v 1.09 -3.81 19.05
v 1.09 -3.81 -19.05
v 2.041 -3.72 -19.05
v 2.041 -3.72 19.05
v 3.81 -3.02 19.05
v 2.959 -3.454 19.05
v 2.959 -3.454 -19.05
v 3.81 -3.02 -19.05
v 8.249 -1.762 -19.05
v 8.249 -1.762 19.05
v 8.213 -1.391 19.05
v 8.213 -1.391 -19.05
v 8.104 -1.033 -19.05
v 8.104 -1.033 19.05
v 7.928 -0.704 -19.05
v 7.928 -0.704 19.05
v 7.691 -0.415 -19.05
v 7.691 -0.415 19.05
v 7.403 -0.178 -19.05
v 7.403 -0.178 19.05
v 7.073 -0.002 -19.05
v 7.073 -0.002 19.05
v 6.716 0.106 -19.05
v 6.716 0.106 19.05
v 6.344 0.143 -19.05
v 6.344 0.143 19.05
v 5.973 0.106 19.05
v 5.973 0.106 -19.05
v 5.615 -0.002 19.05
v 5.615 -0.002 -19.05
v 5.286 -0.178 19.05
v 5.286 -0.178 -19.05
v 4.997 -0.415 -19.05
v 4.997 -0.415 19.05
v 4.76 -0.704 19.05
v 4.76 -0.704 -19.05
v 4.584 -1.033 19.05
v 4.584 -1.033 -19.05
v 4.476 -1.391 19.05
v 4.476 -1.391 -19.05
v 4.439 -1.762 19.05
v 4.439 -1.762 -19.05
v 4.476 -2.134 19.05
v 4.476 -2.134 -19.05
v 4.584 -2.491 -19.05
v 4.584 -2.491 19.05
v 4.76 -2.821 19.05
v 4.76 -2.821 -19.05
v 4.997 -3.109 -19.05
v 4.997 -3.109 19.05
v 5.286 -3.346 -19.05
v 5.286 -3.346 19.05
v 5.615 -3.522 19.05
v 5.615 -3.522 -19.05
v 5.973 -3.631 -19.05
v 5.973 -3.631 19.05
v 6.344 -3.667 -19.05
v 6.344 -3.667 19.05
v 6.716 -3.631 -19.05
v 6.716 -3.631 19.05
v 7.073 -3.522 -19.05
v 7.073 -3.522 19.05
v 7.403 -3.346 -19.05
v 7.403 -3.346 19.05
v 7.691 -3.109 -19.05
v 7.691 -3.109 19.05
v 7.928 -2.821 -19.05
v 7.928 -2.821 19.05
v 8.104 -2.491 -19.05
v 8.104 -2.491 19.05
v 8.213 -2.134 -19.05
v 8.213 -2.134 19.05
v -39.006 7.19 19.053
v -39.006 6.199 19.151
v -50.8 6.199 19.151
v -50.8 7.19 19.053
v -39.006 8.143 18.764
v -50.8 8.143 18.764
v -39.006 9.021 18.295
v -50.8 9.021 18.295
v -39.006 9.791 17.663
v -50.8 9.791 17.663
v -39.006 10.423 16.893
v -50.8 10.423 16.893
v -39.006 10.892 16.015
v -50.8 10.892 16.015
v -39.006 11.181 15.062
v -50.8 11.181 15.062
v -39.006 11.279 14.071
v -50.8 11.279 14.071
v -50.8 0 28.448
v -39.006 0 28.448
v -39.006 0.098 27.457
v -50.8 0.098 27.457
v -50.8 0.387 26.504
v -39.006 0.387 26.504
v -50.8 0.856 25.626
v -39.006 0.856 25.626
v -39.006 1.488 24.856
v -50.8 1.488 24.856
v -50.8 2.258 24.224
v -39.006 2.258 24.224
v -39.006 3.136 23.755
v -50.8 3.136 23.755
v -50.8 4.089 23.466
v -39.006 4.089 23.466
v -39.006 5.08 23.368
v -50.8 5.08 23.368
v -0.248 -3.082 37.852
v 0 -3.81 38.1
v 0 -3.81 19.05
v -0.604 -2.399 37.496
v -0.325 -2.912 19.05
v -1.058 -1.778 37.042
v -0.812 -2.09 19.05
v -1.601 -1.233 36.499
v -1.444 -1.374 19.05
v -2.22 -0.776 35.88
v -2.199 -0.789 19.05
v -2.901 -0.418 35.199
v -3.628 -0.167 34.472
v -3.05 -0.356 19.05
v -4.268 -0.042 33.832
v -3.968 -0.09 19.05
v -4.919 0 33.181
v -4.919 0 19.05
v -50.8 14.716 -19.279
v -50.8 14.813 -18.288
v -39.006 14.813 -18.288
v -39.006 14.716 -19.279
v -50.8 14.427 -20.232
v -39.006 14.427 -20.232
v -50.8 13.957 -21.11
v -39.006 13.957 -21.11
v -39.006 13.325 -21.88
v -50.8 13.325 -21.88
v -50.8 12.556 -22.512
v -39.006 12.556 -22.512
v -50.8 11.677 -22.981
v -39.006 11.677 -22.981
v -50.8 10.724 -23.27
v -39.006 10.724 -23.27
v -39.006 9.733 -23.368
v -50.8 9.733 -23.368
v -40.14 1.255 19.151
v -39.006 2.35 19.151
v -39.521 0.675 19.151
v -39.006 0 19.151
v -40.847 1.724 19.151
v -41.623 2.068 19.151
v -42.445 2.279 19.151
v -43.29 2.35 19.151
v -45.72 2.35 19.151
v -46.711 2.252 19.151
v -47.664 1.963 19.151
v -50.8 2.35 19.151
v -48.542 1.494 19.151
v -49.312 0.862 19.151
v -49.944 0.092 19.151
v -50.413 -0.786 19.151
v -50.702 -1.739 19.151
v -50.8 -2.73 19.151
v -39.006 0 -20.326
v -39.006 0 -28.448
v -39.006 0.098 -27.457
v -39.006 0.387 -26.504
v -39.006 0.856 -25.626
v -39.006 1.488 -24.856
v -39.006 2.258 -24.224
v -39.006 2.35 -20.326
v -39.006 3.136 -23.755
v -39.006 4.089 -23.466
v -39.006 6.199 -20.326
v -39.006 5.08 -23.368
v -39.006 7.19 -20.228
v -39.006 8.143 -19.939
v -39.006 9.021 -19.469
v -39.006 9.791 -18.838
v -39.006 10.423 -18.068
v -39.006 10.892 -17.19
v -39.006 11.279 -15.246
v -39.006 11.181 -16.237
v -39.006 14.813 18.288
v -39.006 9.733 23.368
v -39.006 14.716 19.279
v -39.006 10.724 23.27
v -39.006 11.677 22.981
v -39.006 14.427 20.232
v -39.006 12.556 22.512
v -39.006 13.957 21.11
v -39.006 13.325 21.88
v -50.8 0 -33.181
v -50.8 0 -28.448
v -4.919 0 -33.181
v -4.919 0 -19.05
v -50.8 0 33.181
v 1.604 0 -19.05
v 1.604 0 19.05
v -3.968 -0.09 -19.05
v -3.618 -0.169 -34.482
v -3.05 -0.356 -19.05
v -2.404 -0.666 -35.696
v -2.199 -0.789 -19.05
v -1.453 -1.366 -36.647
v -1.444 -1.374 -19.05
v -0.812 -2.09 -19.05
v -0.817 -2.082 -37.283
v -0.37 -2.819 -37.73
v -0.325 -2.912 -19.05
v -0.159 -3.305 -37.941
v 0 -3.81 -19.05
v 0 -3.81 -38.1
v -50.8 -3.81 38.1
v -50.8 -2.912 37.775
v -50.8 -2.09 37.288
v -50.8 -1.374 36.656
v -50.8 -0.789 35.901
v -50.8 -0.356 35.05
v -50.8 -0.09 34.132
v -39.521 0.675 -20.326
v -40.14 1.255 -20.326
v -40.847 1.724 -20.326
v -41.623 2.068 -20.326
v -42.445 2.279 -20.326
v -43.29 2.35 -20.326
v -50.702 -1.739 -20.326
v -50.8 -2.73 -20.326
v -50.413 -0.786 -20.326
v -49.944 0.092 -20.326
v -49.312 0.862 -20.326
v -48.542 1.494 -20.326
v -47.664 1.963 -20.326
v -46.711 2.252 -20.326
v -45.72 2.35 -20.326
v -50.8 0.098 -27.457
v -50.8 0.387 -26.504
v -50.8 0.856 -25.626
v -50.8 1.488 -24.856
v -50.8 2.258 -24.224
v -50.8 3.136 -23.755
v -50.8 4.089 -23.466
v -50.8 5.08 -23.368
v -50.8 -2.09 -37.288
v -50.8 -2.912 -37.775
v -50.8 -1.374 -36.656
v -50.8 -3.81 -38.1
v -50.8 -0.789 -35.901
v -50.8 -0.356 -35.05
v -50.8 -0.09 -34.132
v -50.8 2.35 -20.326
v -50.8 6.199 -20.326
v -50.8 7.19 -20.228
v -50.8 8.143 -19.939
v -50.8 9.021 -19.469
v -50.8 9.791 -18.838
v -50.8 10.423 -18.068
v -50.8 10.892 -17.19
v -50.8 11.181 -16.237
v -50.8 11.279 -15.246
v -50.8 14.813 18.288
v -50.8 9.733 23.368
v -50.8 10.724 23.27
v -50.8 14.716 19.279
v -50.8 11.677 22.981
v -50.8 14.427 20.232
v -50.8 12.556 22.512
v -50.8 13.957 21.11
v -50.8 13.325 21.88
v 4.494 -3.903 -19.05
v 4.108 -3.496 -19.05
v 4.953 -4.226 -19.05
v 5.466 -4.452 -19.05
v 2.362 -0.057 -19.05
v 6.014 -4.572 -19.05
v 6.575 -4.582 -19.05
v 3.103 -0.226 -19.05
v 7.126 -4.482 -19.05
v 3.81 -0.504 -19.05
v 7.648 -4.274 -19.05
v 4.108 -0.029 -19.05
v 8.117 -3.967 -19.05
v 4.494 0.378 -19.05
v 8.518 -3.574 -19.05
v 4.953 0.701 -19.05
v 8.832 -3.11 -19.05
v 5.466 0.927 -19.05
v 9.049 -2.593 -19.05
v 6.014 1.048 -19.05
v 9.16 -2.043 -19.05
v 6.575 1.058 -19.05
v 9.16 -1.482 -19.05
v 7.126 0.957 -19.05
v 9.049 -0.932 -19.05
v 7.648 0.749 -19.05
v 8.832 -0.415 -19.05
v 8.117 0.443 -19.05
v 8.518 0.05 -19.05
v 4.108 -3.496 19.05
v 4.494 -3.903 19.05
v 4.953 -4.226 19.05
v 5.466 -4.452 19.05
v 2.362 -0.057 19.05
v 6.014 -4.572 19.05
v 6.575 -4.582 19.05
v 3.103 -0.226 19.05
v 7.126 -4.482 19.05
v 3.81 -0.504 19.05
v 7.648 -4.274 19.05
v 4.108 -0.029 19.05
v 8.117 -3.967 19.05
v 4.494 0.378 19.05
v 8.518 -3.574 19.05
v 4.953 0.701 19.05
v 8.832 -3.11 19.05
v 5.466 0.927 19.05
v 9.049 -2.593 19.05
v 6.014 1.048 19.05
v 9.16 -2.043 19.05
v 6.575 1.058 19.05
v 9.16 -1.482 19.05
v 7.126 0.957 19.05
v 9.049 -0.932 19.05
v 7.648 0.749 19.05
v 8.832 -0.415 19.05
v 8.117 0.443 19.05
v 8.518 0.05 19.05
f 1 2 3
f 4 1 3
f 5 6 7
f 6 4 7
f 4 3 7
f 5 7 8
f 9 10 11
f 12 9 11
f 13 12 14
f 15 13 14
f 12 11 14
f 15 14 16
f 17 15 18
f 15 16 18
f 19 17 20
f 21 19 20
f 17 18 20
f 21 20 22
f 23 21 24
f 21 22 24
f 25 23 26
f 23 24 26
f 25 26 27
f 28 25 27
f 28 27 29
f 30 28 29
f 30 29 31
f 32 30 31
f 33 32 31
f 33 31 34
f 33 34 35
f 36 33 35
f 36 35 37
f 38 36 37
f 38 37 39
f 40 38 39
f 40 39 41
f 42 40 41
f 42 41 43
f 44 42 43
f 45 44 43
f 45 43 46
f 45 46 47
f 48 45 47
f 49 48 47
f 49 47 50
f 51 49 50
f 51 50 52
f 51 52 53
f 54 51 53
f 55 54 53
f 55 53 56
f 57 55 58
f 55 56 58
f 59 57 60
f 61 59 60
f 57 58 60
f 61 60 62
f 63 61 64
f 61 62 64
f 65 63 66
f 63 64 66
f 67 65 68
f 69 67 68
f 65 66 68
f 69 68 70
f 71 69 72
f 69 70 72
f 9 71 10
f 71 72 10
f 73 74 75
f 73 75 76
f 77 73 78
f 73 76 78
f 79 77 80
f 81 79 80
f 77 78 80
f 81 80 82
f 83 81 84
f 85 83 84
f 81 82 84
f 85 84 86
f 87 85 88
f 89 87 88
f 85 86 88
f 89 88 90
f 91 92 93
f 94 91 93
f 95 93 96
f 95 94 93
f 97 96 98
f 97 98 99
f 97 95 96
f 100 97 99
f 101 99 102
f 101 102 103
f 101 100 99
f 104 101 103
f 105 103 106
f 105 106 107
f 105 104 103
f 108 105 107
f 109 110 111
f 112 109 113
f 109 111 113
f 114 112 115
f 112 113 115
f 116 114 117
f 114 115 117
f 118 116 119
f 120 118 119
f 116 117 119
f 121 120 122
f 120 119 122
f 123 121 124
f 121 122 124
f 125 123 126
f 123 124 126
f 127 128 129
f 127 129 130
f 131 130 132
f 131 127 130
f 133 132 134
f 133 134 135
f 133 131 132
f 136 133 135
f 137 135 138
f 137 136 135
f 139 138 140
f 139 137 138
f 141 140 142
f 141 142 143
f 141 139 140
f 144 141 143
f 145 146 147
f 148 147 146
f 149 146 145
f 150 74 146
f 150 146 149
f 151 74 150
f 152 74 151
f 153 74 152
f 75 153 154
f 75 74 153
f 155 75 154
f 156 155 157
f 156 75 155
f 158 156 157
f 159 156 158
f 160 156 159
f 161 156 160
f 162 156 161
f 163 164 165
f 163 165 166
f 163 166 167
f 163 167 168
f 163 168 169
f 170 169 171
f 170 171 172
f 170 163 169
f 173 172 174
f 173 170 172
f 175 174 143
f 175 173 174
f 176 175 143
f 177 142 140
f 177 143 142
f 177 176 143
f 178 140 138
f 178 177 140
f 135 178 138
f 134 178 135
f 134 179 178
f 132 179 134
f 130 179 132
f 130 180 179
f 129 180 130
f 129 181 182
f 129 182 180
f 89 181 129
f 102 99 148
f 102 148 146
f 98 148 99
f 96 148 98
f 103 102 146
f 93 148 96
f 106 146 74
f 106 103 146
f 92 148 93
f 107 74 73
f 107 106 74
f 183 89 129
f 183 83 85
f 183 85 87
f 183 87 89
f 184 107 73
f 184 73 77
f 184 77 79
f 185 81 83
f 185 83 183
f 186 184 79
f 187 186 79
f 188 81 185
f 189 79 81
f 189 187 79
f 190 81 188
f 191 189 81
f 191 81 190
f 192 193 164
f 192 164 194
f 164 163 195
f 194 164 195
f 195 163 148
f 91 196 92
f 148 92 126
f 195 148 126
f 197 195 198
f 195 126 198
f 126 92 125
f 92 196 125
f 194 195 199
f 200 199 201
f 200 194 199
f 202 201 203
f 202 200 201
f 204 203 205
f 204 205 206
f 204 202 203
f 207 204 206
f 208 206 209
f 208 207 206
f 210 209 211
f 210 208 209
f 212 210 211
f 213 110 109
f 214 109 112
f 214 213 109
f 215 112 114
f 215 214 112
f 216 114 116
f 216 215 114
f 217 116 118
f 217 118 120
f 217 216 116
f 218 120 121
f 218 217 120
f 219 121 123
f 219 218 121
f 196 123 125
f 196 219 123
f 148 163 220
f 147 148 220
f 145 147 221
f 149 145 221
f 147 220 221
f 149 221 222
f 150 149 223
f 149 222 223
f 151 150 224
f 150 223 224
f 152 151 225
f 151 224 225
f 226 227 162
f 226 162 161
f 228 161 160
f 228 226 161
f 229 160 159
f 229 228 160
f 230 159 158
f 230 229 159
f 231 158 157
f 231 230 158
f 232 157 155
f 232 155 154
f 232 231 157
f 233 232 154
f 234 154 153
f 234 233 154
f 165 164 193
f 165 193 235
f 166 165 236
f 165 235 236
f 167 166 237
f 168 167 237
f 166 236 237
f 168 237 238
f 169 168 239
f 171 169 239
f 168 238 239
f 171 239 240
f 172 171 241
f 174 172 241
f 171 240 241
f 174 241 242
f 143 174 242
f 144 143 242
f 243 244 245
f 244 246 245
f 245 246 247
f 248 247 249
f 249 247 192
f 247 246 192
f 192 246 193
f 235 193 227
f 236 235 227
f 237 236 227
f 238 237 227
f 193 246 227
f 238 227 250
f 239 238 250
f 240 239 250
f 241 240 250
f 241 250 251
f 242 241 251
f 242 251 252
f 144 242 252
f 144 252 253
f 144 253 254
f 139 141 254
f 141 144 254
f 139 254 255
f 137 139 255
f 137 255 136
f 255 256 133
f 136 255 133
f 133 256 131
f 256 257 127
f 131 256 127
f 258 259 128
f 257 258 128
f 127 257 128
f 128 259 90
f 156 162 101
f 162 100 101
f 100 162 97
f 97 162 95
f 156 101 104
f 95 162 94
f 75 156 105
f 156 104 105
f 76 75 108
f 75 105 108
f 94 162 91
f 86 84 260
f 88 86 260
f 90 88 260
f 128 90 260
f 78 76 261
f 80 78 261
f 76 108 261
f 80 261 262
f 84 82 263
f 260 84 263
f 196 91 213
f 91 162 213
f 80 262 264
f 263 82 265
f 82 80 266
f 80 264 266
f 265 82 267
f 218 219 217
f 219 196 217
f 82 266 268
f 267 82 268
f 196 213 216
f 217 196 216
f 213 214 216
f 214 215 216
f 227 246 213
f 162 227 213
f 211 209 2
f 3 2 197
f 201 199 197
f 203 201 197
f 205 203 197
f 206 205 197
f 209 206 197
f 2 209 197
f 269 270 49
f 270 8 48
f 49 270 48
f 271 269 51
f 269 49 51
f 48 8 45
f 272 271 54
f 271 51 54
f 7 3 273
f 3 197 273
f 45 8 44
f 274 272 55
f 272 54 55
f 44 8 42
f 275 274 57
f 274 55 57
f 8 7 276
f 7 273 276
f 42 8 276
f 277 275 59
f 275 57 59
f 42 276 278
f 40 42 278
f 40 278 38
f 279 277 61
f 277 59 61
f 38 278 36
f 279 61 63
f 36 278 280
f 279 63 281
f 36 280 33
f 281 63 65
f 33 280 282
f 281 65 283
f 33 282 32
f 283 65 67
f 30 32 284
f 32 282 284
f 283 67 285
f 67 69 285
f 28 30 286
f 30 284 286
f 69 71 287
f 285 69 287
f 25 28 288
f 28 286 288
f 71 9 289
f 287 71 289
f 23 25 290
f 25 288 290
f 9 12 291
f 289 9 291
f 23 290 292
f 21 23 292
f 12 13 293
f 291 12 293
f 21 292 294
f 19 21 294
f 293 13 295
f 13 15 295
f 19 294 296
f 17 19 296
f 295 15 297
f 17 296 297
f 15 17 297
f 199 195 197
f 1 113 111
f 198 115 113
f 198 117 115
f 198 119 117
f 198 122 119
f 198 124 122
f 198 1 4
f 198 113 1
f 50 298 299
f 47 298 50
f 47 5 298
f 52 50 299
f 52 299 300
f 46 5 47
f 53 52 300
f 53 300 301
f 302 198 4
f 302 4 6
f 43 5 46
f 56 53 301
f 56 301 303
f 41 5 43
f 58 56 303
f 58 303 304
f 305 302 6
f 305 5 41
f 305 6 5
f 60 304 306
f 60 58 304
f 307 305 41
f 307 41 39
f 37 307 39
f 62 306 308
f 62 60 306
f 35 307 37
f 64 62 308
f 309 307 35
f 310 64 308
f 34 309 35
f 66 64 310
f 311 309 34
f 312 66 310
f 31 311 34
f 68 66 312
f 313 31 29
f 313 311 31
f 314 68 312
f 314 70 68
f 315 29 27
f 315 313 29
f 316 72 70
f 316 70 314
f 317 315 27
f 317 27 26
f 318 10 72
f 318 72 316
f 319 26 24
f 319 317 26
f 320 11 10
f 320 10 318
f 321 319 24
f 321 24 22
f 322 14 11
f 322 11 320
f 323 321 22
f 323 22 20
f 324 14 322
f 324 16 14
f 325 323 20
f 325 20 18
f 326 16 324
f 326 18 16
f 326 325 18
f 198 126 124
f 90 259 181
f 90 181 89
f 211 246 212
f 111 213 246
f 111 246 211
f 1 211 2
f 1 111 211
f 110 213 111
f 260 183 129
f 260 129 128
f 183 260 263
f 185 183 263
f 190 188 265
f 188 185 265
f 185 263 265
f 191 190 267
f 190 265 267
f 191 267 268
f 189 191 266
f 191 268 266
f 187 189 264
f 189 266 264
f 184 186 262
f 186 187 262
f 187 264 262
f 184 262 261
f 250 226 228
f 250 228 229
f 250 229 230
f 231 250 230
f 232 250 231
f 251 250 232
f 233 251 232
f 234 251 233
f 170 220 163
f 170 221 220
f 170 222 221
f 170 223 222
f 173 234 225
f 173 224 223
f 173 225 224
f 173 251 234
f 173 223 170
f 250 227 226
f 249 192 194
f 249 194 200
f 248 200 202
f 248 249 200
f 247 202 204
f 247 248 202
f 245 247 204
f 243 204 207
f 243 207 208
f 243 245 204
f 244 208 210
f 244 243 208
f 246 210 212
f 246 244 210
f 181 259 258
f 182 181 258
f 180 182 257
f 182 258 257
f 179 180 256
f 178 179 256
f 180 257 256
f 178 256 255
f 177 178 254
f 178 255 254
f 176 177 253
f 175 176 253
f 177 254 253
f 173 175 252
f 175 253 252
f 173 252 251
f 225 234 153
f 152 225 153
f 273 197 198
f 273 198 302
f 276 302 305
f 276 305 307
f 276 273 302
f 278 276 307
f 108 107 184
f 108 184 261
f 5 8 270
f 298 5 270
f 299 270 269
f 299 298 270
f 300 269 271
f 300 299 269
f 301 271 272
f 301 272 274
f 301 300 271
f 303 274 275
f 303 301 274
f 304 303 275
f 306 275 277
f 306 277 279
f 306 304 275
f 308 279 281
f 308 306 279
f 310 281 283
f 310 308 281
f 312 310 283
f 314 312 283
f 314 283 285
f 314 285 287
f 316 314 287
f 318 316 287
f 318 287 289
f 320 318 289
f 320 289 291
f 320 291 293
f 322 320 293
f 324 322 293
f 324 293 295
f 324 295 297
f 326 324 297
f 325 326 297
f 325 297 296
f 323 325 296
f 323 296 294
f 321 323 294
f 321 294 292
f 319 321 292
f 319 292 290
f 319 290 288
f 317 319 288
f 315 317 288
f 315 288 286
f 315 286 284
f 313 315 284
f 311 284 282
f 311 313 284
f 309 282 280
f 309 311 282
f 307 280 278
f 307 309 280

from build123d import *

# Parameters (mm, degrees)
F0_W          = 3.81
F0_H          = 38.1
F1_DEPTH      = 3.81
F2_R          = 2.8295085799
F3_DEPTH      = 19.05
F3_DEPTH_BACK = 19.05
F4_R          = 1.905
F5_DEPTH      = 47.01882
F6_W          = 11.7936587512
F6_H          = 46.736
F7_DEPTH      = 14.81339
F8_W          = 8.9291655459
F8_H          = 39.4763015211
F9_DEPTH      = 25.4
F10_T1_DEPTH  = 11.7936587512
F10_T3_DEPTH  = 11.7936587512
F10_T5_DEPTH  = 11.7936587512
F10_T7_DEPTH  = 11.7936587512
F10_T9_DEPTH  = 39.4763015211
F10_T11_DEPTH = 37.1936587512
F10_T13_DEPTH = 37.1936587512
F10_T15_DEPTH = 39.4763015211
F11_T1_DEPTH  = 75.3934442484
F11_T3_DEPTH  = 31.3467221242
F11_T5_DEPTH  = 31.3467221242
F11_T7_DEPTH  = 49.1322772947
F11_T9_DEPTH  = 51.6998748204


# Not quite as in the source:
# - a fillet or chamfer that OpenCascade refuses, or shapes differently, is made with other operations: its cross-section is extruded or revolved along the edge and cut away or added


with BuildPart() as f1:
    # F0 (on Front) → F1 (new body)
    with BuildSketch(Plane.XZ):
        Polygon((0, 38.1), (-50.8, 38.1), (-50.8, -38.1), (0, -38.1), (0, -19.05), (0, 19.05), align=None)
        with Locations((1.905, 0)):
            Rectangle(F0_W, F0_H)
    extrude(amount=F1_DEPTH)

    # F2 (on Top) → F3 (join, two sides)
    with BuildSketch(Plane.XY) as f3_sk:
        with Locations((6.3444059342, -1.762334723)):
            Circle(F2_R)
    extrude(amount=F3_DEPTH)
    extrude(f3_sk.sketch, amount=-F3_DEPTH_BACK)

    # F4 (on face) → F5 (cut)
    with BuildSketch(Plane.XY.offset(19.05)):
        with Locations((6.3444059342, -1.762334723)):
            Circle(F4_R)
    extrude(amount=-F5_DEPTH, mode=Mode.SUBTRACT)

    # F6 (on face) → F7 (join)
    with BuildSketch(Plane(origin=(0, 0, 0), x_dir=(-1, 0, 0), z_dir=(0, 1, 0))):
        with Locations((44.9031706244, 0)):
            Rectangle(F6_W, F6_H)
    extrude(amount=F7_DEPTH)

    # F8 (on face) → F9 (cut)
    with BuildSketch(Plane(origin=(-50.8, 0, 0), x_dir=(0, -1, 0), z_dir=(-1, 0, 0))):
        with Locations((-6.8143603858, -0.5874447525)):
            Rectangle(F8_W, F8_H)
    extrude(amount=-F9_DEPTH, mode=Mode.SUBTRACT)

    # F10: fillet of radius 5.08 on 8 edges, made by hand

    # F10_s2 → F10_t1 (join)
    with BuildSketch(Plane.YZ.offset(-50.8)):
        with BuildLine():
            ThreePointArc((0, -28.448), (1.4878975516, -24.8558975516), (5.08, -23.368))
            Line((5.08, -23.368), (0, -23.368))
            Line((0, -23.368), (0, -28.448))
        make_face()
    extrude(amount=F10_T1_DEPTH)

    # F10_s4 → F10_t3 (join)
    with BuildSketch(Plane.YZ.offset(-50.8)):
        with BuildLine():
            ThreePointArc((0, 28.448), (1.4878975516, 24.8558975516), (5.08, 23.368))
            Line((5.08, 23.368), (0, 23.368))
            Line((0, 23.368), (0, 28.448))
        make_face()
    extrude(amount=F10_T3_DEPTH)

    # F10_s6 → F10_t5 (join)
    with BuildSketch(Plane.YZ.offset(-50.8)):
        with BuildLine():
            ThreePointArc((11.2789431587, -15.245595513), (9.7910456071, -18.8376979614), (6.1989431587, -20.325595513))
            Line((6.1989431587, -20.325595513), (11.2789431587, -20.325595513))
            Line((11.2789431587, -20.325595513), (11.2789431587, -15.245595513))
        make_face()
    extrude(amount=F10_T5_DEPTH)

    # F10_s8 → F10_t7 (join)
    with BuildSketch(Plane.YZ.offset(-50.8)):
        with BuildLine():
            ThreePointArc((6.1989431587, 19.1507060081), (9.7910456071, 17.6628084565), (11.2789431587, 14.0707060081))
            Line((11.2789431587, 14.0707060081), (11.2789431587, 19.1507060081))
            Line((11.2789431587, 19.1507060081), (6.1989431587, 19.1507060081))
        make_face()
    extrude(amount=F10_T7_DEPTH)

    # F10_s10 → F10_t9 (cut)
    with BuildSketch(Plane.XY.offset(-20.325595513)):
        with BuildLine():
            ThreePointArc((-50.8, -2.7302223872), (-49.3121024484, 0.8618800613), (-45.72, 2.3497776128))
            Line((-45.72, 2.3497776128), (-50.8, 2.3497776128))
            Line((-50.8, 2.3497776128), (-50.8, -2.7302223872))
        make_face()
    extrude(amount=F10_T9_DEPTH, mode=Mode.SUBTRACT)

    # F10_s12 → F10_t11 (cut)
    with BuildSketch(Plane.YZ.offset(-63.5)):
        with BuildLine():
            ThreePointArc((14.81339, 18.288), (13.3254924484, 21.8801024484), (9.73339, 23.368))
            Line((9.73339, 23.368), (14.81339, 23.368))
            Line((14.81339, 23.368), (14.81339, 18.288))
        make_face()
    extrude(amount=F10_T11_DEPTH, mode=Mode.SUBTRACT)

    # F10_s14 → F10_t13 (cut)
    with BuildSketch(Plane.YZ.offset(-63.5)):
        with BuildLine():
            ThreePointArc((14.81339, -18.288), (13.3254924484, -21.8801024484), (9.73339, -23.368))
            Line((9.73339, -23.368), (14.81339, -23.368))
            Line((14.81339, -23.368), (14.81339, -18.288))
        make_face()
    extrude(amount=F10_T13_DEPTH, mode=Mode.SUBTRACT)

    # F10_s16 → F10_t15 (cut)
    with BuildSketch(Plane.XY.offset(-20.325595513)):
        with BuildLine():
            ThreePointArc((-39.0063412488, 0), (-40.8472599359, 1.7237606464), (-43.2902980315, 2.3497776128))
            Line((-43.2902980315, 2.3497776128), (-39.0063412488, 2.3497776128))
            Line((-39.0063412488, 2.3497776128), (-39.0063412488, 0))
        make_face()
    extrude(amount=F10_T15_DEPTH, mode=Mode.SUBTRACT)

    # F11: fillet of radius 5.08 on 6 edges, made by hand

    # F11_s2 → F11_t1 (cut)
    with BuildSketch(Plane.YZ.offset(-63.0967221242)):
        with BuildLine():
            ThreePointArc((0, -33.1813111503), (-1.0639073716, -36.2921631237), (-3.81, -38.1))
            Line((-3.81, -38.1), (0, -38.1))
            Line((0, -38.1), (0, -33.1813111503))
        make_face()
        with BuildLine():
            ThreePointArc((-3.81, 38.1), (-1.0639073716, 36.2921631237), (0, 33.1813111503))
            Line((0, 33.1813111503), (0, 38.1))
            Line((0, 38.1), (-3.81, 38.1))
        make_face()
    extrude(amount=F11_T1_DEPTH, mode=Mode.SUBTRACT)

    # F11_s4 → F11_t3 (cut)
    with BuildSketch(Plane.XY.offset(19.05)):
        with BuildLine():
            ThreePointArc((0, -3.81), (-1.8078368763, -1.0639073716), (-4.9186888497, 0))
            Line((-4.9186888497, 0), (0, 0))
            Line((0, 0), (0, -3.81))
        make_face()
    extrude(amount=F11_T3_DEPTH, mode=Mode.SUBTRACT)

    # F11_s6 → F11_t5 (cut)
    with BuildSketch(Plane.XY.offset(-50.3967221242)):
        with BuildLine():
            ThreePointArc((-4.9186888497, 0), (-1.8078368763, -1.0639073716), (0, -3.81))
            Line((0, -3.81), (0, 0))
            Line((0, 0), (-4.9186888497, 0))
        make_face()
    extrude(amount=F11_T5_DEPTH, mode=Mode.SUBTRACT)

    # F11_s8 → F11_t7 (cut)
    with BuildSketch(Plane.XY.offset(-24.5661386473)):
        with BuildLine():
            ThreePointArc((1.6035445411, 0), (2.7352095066, -0.1276536464), (3.81, -0.5041990529))
            Line((3.81, -0.5041990529), (3.81, 0))
            Line((3.81, 0), (1.6035445411, 0))
        make_face()
    extrude(amount=F11_T7_DEPTH, mode=Mode.SUBTRACT)

    # F11_s10 → F11_t9 (cut)
    with BuildSketch(Plane.XY.offset(-25.8499374102)):
        with BuildLine():
            ThreePointArc((1.0900250359, -3.81), (2.5061483361, -3.6086263229), (3.81, -3.0204703932))
            Line((3.81, -3.0204703932), (3.81, -3.81))
            Line((3.81, -3.81), (1.0900250359, -3.81))
        make_face()
    extrude(amount=F11_T9_DEPTH, mode=Mode.SUBTRACT)


solid = f1.part
